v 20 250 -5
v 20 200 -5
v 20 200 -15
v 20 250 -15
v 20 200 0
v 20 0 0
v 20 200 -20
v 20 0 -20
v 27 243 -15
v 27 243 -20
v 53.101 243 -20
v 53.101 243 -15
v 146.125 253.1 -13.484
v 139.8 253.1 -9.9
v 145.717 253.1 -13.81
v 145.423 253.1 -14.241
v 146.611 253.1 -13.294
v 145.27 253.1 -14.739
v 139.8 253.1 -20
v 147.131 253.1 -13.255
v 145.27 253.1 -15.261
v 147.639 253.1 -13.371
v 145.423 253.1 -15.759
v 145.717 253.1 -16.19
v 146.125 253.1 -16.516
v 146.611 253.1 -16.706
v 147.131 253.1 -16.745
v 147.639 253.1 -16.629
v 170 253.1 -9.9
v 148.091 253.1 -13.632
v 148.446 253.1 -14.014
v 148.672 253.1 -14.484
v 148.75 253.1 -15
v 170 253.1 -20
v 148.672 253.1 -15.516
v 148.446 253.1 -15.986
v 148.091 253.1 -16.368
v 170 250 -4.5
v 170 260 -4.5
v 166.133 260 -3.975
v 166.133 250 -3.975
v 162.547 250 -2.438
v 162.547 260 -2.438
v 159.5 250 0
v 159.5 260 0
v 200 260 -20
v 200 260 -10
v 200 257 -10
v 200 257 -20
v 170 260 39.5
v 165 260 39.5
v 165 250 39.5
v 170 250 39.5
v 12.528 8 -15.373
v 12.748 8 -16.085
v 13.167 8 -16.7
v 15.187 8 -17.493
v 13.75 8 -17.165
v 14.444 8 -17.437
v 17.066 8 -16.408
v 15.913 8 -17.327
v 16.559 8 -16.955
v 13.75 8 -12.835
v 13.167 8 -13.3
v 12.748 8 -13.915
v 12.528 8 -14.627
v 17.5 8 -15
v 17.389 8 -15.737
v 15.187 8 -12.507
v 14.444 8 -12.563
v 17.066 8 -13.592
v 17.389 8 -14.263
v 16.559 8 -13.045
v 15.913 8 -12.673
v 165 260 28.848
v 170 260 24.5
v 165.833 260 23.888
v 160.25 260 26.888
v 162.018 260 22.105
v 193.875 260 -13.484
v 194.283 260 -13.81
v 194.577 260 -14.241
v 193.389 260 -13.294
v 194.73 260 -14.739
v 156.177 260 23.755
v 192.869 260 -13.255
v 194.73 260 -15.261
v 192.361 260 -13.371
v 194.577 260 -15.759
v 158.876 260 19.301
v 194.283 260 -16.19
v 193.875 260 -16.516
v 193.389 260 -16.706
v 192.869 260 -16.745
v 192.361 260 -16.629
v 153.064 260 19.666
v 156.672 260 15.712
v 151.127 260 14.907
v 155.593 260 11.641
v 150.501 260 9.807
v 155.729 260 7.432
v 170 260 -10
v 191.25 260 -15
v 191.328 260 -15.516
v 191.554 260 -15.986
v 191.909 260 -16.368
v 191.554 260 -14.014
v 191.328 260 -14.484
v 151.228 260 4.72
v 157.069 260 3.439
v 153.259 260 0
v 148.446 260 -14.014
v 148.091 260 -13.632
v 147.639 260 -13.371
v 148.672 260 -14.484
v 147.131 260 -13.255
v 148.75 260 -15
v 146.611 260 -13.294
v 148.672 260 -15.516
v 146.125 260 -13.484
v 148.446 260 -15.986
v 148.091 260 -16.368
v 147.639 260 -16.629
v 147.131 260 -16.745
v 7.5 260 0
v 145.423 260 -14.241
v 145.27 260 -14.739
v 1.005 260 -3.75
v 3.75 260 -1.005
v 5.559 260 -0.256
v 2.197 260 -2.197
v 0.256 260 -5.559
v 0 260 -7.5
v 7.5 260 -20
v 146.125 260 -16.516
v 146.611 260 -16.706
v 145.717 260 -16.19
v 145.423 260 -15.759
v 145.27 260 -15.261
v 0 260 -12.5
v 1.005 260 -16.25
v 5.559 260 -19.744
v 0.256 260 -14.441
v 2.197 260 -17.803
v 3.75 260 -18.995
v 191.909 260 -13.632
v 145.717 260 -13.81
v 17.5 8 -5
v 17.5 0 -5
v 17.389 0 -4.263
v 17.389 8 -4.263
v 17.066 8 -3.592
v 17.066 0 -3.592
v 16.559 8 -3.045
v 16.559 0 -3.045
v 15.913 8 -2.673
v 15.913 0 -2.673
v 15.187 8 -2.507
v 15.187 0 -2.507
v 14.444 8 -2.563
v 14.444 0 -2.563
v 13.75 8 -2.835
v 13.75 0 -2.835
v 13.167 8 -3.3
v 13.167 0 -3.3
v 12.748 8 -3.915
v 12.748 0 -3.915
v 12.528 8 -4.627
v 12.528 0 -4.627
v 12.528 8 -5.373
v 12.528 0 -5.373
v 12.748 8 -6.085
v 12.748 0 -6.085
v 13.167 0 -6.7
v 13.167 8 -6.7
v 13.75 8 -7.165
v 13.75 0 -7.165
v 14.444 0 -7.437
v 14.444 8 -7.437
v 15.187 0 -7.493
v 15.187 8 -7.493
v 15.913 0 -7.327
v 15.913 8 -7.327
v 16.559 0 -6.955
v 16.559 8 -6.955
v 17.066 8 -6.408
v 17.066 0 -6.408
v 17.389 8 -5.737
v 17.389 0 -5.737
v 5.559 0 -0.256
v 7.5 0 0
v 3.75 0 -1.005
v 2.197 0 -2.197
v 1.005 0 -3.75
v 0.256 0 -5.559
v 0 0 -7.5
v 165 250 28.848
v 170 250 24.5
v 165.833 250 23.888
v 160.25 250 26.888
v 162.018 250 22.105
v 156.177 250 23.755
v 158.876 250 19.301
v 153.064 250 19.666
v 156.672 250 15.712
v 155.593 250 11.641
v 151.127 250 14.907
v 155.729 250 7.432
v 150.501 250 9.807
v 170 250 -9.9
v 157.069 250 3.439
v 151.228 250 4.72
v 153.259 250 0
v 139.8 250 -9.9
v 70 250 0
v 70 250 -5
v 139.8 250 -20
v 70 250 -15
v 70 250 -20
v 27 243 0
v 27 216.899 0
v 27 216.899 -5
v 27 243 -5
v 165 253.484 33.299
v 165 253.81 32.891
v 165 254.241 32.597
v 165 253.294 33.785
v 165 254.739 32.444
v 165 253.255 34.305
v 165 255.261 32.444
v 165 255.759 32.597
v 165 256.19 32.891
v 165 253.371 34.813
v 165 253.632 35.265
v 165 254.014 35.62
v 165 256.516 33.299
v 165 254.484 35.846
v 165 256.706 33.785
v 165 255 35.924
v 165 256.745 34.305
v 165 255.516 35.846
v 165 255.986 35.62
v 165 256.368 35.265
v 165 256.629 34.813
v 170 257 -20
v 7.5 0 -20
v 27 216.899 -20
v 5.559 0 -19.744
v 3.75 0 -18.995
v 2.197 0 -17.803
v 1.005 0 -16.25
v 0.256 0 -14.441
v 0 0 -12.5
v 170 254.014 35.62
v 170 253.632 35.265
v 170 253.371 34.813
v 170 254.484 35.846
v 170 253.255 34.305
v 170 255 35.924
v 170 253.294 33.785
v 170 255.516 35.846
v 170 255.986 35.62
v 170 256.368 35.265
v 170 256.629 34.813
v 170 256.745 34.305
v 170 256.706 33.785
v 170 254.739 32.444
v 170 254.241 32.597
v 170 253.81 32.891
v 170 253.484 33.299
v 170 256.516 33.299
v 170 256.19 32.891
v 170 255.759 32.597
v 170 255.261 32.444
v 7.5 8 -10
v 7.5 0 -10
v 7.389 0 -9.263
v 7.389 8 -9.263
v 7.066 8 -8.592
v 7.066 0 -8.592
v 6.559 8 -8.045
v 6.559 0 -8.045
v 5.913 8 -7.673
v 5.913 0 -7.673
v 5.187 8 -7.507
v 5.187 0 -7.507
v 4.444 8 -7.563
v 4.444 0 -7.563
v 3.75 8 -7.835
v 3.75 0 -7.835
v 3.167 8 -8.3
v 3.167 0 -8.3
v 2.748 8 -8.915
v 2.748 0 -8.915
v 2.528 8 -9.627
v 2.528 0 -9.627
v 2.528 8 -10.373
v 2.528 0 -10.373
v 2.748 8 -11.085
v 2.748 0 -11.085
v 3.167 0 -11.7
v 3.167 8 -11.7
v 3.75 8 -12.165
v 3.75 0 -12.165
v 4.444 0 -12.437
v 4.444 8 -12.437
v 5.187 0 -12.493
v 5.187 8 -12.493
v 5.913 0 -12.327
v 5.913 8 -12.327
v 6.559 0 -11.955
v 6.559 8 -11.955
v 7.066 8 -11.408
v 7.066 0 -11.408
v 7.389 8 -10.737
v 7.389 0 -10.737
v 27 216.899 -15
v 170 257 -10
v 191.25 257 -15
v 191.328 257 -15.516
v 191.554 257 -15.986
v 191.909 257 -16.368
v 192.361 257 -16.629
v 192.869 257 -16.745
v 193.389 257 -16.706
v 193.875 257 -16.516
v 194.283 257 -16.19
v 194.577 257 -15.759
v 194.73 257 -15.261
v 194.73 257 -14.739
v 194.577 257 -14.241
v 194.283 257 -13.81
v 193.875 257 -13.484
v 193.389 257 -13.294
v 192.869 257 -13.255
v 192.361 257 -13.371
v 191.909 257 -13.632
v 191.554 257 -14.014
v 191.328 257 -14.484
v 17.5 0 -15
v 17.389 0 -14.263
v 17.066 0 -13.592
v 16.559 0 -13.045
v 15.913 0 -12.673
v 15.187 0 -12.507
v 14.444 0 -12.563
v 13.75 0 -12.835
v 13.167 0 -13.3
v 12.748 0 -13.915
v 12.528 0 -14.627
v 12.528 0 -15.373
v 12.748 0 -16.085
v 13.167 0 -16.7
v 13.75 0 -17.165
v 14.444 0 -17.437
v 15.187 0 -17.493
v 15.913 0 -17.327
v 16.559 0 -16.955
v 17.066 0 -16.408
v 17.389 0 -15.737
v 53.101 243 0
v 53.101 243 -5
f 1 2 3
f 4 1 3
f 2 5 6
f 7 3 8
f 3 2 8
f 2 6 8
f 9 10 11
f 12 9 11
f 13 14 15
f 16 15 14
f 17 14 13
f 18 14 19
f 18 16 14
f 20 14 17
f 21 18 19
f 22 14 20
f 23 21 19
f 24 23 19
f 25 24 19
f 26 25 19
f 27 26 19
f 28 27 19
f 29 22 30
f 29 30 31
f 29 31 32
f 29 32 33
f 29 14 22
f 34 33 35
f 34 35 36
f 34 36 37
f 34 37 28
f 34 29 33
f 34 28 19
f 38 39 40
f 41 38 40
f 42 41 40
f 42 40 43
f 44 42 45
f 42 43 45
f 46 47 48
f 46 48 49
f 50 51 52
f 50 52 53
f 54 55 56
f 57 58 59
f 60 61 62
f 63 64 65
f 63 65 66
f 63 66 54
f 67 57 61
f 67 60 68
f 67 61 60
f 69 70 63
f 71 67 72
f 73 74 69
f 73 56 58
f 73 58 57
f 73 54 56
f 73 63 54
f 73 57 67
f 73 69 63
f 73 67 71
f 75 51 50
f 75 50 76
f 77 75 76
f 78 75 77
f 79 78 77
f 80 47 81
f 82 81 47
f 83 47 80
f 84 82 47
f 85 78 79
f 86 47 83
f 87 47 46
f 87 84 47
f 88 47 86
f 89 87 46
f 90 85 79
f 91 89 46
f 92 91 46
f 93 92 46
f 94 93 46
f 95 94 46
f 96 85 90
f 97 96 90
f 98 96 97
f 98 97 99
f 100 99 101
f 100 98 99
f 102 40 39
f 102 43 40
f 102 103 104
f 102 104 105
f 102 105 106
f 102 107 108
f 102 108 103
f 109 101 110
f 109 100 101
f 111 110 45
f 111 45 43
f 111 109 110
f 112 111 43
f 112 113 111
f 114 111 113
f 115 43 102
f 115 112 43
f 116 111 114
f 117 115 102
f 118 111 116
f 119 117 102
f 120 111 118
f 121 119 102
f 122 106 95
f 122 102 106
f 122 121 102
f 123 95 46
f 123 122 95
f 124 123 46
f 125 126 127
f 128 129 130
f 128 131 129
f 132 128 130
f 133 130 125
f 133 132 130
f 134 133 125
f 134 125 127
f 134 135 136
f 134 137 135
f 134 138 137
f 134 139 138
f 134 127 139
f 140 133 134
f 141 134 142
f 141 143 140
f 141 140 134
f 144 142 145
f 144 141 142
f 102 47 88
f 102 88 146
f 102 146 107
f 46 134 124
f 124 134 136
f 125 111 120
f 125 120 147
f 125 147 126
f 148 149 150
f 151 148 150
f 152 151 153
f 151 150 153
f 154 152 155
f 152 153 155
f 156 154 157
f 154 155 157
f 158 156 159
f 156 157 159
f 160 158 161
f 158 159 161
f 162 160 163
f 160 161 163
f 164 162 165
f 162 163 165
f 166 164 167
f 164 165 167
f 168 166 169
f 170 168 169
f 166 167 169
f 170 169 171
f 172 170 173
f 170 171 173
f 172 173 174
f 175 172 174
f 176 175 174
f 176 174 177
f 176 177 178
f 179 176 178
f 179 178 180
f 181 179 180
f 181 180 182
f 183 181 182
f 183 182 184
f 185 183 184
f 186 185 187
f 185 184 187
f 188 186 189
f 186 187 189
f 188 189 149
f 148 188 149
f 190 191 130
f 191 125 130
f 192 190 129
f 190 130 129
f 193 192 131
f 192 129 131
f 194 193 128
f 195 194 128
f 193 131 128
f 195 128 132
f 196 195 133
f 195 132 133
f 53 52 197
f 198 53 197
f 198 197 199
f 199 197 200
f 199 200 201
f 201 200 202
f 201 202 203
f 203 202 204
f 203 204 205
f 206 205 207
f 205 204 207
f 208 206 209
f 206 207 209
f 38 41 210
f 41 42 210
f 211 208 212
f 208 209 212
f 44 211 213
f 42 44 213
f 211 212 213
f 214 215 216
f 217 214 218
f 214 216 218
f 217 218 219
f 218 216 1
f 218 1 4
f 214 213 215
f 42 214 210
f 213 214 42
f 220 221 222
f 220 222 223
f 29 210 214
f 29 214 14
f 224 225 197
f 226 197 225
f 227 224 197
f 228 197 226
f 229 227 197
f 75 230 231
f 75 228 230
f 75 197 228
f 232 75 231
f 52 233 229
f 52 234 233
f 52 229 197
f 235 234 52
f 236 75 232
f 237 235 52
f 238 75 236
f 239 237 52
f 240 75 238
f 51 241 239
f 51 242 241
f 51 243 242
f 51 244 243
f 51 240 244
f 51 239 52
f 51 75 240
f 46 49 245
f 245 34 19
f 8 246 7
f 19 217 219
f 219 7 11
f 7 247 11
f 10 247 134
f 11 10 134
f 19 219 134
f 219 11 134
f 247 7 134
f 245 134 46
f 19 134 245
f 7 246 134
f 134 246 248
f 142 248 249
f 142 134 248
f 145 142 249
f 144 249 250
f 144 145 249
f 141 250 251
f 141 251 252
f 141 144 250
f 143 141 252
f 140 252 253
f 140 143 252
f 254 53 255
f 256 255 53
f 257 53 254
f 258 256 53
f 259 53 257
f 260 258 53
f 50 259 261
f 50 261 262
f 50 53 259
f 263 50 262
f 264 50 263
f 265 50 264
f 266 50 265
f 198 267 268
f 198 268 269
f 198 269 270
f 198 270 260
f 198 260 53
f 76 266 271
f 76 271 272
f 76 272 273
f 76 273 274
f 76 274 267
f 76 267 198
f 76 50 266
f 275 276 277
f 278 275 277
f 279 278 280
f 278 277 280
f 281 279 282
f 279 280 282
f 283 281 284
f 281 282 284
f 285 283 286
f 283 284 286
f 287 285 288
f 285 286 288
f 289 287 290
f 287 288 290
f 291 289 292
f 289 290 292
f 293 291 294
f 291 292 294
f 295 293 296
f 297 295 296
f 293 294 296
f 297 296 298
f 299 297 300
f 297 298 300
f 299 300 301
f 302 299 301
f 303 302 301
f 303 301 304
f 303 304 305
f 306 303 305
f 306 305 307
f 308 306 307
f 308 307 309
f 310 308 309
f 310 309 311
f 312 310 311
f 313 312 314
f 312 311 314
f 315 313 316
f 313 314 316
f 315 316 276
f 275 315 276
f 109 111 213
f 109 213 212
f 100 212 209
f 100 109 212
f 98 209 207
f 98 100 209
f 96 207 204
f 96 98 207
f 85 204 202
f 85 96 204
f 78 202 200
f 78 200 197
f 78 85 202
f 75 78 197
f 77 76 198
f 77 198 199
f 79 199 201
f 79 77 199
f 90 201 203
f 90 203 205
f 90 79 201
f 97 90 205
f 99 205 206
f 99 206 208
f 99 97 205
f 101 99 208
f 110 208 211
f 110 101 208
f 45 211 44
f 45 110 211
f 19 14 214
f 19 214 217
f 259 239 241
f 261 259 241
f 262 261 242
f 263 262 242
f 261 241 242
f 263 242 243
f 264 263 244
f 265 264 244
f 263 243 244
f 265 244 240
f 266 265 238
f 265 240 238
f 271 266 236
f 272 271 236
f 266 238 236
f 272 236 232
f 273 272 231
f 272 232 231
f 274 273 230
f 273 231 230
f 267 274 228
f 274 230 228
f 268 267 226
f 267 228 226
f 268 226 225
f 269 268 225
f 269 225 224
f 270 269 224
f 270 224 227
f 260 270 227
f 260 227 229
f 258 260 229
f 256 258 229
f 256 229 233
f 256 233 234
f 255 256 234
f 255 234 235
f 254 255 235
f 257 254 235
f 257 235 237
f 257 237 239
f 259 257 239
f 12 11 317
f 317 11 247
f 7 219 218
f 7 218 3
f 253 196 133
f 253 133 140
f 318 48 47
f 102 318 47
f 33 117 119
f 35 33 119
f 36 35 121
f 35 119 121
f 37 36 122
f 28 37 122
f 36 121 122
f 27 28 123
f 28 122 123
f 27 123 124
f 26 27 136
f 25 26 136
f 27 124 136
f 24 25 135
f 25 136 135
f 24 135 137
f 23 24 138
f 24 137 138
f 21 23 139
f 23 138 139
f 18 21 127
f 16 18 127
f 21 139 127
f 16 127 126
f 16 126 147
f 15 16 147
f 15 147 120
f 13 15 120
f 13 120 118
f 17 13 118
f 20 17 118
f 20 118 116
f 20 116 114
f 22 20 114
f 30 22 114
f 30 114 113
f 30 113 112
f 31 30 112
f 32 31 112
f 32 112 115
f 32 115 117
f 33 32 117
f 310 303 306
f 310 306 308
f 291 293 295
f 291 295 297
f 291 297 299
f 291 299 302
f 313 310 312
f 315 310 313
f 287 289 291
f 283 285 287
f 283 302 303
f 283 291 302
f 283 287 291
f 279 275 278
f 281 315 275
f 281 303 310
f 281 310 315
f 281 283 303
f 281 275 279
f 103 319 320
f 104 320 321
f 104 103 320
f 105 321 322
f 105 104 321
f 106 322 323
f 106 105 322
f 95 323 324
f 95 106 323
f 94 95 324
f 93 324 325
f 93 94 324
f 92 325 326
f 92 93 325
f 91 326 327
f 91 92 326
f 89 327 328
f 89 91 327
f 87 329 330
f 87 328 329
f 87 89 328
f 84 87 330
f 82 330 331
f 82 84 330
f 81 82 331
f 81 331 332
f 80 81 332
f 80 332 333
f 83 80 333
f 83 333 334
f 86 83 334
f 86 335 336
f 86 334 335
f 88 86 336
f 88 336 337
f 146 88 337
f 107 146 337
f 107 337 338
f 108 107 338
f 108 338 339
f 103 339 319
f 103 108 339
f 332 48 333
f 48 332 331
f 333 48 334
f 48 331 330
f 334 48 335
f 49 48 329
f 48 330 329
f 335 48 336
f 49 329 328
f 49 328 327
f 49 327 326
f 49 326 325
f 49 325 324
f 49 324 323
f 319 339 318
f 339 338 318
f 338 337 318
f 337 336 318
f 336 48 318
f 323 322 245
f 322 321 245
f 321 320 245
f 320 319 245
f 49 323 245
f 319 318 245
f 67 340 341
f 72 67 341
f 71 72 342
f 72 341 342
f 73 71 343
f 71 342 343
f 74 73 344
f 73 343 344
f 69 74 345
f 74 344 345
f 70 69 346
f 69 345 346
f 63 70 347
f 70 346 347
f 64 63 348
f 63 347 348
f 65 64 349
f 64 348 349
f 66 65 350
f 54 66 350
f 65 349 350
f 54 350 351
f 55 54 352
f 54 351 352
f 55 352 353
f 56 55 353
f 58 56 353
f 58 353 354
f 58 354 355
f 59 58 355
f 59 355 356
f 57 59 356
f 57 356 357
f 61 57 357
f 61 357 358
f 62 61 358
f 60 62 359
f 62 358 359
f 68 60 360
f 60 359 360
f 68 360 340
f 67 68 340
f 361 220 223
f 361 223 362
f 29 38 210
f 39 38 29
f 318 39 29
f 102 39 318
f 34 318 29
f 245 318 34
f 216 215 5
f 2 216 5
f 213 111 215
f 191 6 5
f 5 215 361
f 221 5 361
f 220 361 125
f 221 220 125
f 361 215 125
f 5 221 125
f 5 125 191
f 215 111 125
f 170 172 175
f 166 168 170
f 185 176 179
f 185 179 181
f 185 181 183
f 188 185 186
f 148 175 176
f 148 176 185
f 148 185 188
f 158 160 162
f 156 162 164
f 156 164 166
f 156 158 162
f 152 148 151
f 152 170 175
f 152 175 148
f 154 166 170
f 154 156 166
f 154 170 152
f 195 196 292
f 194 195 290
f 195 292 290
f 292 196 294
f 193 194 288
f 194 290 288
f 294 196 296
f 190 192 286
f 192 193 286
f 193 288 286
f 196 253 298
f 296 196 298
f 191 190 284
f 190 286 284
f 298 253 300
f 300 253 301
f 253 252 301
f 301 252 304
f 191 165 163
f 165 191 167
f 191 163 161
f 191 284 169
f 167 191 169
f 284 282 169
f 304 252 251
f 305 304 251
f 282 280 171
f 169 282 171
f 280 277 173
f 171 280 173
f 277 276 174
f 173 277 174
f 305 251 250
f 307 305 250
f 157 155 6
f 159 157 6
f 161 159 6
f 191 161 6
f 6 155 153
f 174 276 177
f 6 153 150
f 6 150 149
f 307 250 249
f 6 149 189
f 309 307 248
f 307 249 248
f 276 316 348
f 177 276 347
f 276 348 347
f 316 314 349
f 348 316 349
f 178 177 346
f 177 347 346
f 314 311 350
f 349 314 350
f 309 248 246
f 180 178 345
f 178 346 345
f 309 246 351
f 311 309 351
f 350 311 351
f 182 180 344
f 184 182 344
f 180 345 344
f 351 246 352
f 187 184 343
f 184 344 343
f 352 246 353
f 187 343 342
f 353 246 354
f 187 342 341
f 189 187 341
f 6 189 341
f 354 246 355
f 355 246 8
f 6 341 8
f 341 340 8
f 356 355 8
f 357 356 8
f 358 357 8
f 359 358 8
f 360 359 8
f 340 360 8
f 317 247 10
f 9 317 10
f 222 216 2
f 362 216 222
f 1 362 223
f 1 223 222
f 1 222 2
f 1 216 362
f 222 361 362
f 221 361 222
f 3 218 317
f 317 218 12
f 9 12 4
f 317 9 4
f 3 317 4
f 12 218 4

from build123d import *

# Parameters (mm, degrees)
SKETCH1_W           = 20
SKETCH1_H           = 20
BOSS_EXTRUDE1_DEPTH = 260
SKETCH2_W           = 20
SKETCH2_H           = 10
BOSS_EXTRUDE2_DEPTH = 150
BOSS_EXTRUDE3_DEPTH = 10
CUT_EXTRUDE1_DEPTH  = 261
SKETCH4_R           = 1.75
CUT_EXTRUDE2_DEPTH  = 6
BOSS_EXTRUDE4_DEPTH = 5
FILLET3_R           = 7.5
SKETCH7_R           = 2.5
CUT_EXTRUDE3_DEPTH  = 8
SKETCH9_W           = 10
SKETCH9_H           = 3
BOSS_EXTRUDE6_DEPTH = 30
SKETCH10_W          = 10.1
SKETCH10_H          = 3.1
CUT_EXTRUDE4_DEPTH  = 30.2
SKETCH11_R          = 1.75
CUT_EXTRUDE5_DEPTH  = 261


with BuildPart() as part:
    # Sketch1 → Boss-Extrude1 (new body)
    with BuildSketch(Plane(origin=(0, 0, 0), x_dir=(1, 0, 0), z_dir=(0, 1, 0))):
        with Locations((10, 10)):
            Rectangle(SKETCH1_W, SKETCH1_H)
    extrude(amount=BOSS_EXTRUDE1_DEPTH)

    # Sketch2 → Boss-Extrude2 (add)
    with BuildSketch(Plane(origin=(20, 0, 0), x_dir=(0, 0, -1), z_dir=(1, 0, 0))):
        with Locations((10, 255)):
            Rectangle(SKETCH2_W, SKETCH2_H)
    extrude(amount=BOSS_EXTRUDE2_DEPTH)

    # Sketch3 → Boss-Extrude3 (add)
    with BuildSketch(Plane(origin=(0, 260, 0), x_dir=(1, 0, 0), z_dir=(0, 1, 0))):
        with BuildLine():
            Line((159.5, 0), (153.259330957, 0))
            ThreePointArc((153.259330957, 0), (151.938520085, -17.350710392), (165, -28.848076825))
            Line((165, -28.848076825), (165, -24.5))
            Line((165, -24.5), (170, -24.5))
            ThreePointArc((170, -24.5), (156.672397065, -15.711829829), (159.5, 0))
        make_face()
        with BuildLine():
            Line((165, -24.5), (165, -28.848076825))
            ThreePointArc((165, -28.848076825), (167.478839363, -29.336332358), (170, -29.5))
            Line((170, -29.5), (170, -24.5))
            Line((170, -24.5), (165, -24.5))
        make_face()
        with BuildLine():
            ThreePointArc((170, -29.5), (167.478839363, -29.336332358), (165, -28.848076825))
            Line((165, -28.848076825), (165, -39.5))
            Line((165, -39.5), (170, -39.5))
            Line((170, -39.5), (170, -29.5))
        make_face()
    extrude(amount=-BOSS_EXTRUDE3_DEPTH)

    # Sketch3<3> → Cut-Extrude1 (cut, through all)
    with BuildSketch(Plane(origin=(0, 260, 0), x_dir=(1, 0, 0), z_dir=(0, 1, 0))):
        with BuildLine():
            Line((170, 0), (170, 4.5))
            ThreePointArc((170, 4.5), (164.288170171, 3.327602935), (159.5, 0))
            Line((159.5, 0), (170, 0))
        make_face()
    extrude(amount=-CUT_EXTRUDE1_DEPTH, mode=Mode.SUBTRACT)

    # Sketch4 → Cut-Extrude2 (cut, through all)
    with BuildSketch(Plane.ZY.offset(-165)):
        with Locations((34.174038412, 255)):
            Circle(SKETCH4_R)
    extrude(amount=-CUT_EXTRUDE2_DEPTH, mode=Mode.SUBTRACT)

    # Sketch5 → Boss-Extrude4 (add)
    with BuildSketch(Plane.XY):
        Polygon((70, 250), (20, 200), (20, 250), align=None)
        Polygon((53.100505063, 243), (27, 216.899494937), (27, 243), align=None, mode=Mode.SUBTRACT)
    boss_extrude4 = extrude(amount=-BOSS_EXTRUDE4_DEPTH)

    # Mirror1: Boss-Extrude4 across plane
    add(boss_extrude4.mirror(Plane.XY.offset(-10)))

    # Fillet3
    fillet3_edges = [part.edges().sort_by_distance(p)[0] for p in [
        (0, 130, -20),
        (0, 130, 0),
    ]]
    fillet(fillet3_edges, radius=FILLET3_R)

    # Sketch7 → Cut-Extrude3 (cut)
    with BuildSketch(Plane.XZ):
        with Locations((15, -5)):
            Circle(SKETCH7_R)
        with Locations((5, -10)):
            Circle(SKETCH7_R)
        with Locations((15, -15)):
            Circle(SKETCH7_R)
    extrude(amount=-CUT_EXTRUDE3_DEPTH, mode=Mode.SUBTRACT)

    # Sketch9 → Boss-Extrude6 (add)
    with BuildSketch(Plane(origin=(170, 0, 0), x_dir=(0, 0, -1), z_dir=(1, 0, 0))):
        with Locations((15, 258.5)):
            Rectangle(SKETCH9_W, SKETCH9_H)
    extrude(amount=BOSS_EXTRUDE6_DEPTH)

    # Sketch10 → Cut-Extrude4 (cut)
    with BuildSketch(Plane(origin=(170, 0, 0), x_dir=(0, 0, -1), z_dir=(1, 0, 0))):
        with Locations((14.95, 251.55)):
            Rectangle(SKETCH10_W, SKETCH10_H)
    extrude(amount=-CUT_EXTRUDE4_DEPTH, mode=Mode.SUBTRACT)

    # Sketch11 → Cut-Extrude5 (cut, through all)
    with BuildSketch(Plane(origin=(0, 260, 0), x_dir=(1, 0, 0), z_dir=(0, 1, 0))):
        with Locations((147, 15)):
            Circle(SKETCH11_R)
    cut_extrude5 = extrude(amount=-CUT_EXTRUDE5_DEPTH, mode=Mode.SUBTRACT)

    # Mirror2: Cut-Extrude5 across plane
    add(cut_extrude5.mirror(Plane(origin=(170, 0, 0), x_dir=(0, 0, 1), z_dir=(1, 0, 0))), mode=Mode.SUBTRACT)


solid = part.part
